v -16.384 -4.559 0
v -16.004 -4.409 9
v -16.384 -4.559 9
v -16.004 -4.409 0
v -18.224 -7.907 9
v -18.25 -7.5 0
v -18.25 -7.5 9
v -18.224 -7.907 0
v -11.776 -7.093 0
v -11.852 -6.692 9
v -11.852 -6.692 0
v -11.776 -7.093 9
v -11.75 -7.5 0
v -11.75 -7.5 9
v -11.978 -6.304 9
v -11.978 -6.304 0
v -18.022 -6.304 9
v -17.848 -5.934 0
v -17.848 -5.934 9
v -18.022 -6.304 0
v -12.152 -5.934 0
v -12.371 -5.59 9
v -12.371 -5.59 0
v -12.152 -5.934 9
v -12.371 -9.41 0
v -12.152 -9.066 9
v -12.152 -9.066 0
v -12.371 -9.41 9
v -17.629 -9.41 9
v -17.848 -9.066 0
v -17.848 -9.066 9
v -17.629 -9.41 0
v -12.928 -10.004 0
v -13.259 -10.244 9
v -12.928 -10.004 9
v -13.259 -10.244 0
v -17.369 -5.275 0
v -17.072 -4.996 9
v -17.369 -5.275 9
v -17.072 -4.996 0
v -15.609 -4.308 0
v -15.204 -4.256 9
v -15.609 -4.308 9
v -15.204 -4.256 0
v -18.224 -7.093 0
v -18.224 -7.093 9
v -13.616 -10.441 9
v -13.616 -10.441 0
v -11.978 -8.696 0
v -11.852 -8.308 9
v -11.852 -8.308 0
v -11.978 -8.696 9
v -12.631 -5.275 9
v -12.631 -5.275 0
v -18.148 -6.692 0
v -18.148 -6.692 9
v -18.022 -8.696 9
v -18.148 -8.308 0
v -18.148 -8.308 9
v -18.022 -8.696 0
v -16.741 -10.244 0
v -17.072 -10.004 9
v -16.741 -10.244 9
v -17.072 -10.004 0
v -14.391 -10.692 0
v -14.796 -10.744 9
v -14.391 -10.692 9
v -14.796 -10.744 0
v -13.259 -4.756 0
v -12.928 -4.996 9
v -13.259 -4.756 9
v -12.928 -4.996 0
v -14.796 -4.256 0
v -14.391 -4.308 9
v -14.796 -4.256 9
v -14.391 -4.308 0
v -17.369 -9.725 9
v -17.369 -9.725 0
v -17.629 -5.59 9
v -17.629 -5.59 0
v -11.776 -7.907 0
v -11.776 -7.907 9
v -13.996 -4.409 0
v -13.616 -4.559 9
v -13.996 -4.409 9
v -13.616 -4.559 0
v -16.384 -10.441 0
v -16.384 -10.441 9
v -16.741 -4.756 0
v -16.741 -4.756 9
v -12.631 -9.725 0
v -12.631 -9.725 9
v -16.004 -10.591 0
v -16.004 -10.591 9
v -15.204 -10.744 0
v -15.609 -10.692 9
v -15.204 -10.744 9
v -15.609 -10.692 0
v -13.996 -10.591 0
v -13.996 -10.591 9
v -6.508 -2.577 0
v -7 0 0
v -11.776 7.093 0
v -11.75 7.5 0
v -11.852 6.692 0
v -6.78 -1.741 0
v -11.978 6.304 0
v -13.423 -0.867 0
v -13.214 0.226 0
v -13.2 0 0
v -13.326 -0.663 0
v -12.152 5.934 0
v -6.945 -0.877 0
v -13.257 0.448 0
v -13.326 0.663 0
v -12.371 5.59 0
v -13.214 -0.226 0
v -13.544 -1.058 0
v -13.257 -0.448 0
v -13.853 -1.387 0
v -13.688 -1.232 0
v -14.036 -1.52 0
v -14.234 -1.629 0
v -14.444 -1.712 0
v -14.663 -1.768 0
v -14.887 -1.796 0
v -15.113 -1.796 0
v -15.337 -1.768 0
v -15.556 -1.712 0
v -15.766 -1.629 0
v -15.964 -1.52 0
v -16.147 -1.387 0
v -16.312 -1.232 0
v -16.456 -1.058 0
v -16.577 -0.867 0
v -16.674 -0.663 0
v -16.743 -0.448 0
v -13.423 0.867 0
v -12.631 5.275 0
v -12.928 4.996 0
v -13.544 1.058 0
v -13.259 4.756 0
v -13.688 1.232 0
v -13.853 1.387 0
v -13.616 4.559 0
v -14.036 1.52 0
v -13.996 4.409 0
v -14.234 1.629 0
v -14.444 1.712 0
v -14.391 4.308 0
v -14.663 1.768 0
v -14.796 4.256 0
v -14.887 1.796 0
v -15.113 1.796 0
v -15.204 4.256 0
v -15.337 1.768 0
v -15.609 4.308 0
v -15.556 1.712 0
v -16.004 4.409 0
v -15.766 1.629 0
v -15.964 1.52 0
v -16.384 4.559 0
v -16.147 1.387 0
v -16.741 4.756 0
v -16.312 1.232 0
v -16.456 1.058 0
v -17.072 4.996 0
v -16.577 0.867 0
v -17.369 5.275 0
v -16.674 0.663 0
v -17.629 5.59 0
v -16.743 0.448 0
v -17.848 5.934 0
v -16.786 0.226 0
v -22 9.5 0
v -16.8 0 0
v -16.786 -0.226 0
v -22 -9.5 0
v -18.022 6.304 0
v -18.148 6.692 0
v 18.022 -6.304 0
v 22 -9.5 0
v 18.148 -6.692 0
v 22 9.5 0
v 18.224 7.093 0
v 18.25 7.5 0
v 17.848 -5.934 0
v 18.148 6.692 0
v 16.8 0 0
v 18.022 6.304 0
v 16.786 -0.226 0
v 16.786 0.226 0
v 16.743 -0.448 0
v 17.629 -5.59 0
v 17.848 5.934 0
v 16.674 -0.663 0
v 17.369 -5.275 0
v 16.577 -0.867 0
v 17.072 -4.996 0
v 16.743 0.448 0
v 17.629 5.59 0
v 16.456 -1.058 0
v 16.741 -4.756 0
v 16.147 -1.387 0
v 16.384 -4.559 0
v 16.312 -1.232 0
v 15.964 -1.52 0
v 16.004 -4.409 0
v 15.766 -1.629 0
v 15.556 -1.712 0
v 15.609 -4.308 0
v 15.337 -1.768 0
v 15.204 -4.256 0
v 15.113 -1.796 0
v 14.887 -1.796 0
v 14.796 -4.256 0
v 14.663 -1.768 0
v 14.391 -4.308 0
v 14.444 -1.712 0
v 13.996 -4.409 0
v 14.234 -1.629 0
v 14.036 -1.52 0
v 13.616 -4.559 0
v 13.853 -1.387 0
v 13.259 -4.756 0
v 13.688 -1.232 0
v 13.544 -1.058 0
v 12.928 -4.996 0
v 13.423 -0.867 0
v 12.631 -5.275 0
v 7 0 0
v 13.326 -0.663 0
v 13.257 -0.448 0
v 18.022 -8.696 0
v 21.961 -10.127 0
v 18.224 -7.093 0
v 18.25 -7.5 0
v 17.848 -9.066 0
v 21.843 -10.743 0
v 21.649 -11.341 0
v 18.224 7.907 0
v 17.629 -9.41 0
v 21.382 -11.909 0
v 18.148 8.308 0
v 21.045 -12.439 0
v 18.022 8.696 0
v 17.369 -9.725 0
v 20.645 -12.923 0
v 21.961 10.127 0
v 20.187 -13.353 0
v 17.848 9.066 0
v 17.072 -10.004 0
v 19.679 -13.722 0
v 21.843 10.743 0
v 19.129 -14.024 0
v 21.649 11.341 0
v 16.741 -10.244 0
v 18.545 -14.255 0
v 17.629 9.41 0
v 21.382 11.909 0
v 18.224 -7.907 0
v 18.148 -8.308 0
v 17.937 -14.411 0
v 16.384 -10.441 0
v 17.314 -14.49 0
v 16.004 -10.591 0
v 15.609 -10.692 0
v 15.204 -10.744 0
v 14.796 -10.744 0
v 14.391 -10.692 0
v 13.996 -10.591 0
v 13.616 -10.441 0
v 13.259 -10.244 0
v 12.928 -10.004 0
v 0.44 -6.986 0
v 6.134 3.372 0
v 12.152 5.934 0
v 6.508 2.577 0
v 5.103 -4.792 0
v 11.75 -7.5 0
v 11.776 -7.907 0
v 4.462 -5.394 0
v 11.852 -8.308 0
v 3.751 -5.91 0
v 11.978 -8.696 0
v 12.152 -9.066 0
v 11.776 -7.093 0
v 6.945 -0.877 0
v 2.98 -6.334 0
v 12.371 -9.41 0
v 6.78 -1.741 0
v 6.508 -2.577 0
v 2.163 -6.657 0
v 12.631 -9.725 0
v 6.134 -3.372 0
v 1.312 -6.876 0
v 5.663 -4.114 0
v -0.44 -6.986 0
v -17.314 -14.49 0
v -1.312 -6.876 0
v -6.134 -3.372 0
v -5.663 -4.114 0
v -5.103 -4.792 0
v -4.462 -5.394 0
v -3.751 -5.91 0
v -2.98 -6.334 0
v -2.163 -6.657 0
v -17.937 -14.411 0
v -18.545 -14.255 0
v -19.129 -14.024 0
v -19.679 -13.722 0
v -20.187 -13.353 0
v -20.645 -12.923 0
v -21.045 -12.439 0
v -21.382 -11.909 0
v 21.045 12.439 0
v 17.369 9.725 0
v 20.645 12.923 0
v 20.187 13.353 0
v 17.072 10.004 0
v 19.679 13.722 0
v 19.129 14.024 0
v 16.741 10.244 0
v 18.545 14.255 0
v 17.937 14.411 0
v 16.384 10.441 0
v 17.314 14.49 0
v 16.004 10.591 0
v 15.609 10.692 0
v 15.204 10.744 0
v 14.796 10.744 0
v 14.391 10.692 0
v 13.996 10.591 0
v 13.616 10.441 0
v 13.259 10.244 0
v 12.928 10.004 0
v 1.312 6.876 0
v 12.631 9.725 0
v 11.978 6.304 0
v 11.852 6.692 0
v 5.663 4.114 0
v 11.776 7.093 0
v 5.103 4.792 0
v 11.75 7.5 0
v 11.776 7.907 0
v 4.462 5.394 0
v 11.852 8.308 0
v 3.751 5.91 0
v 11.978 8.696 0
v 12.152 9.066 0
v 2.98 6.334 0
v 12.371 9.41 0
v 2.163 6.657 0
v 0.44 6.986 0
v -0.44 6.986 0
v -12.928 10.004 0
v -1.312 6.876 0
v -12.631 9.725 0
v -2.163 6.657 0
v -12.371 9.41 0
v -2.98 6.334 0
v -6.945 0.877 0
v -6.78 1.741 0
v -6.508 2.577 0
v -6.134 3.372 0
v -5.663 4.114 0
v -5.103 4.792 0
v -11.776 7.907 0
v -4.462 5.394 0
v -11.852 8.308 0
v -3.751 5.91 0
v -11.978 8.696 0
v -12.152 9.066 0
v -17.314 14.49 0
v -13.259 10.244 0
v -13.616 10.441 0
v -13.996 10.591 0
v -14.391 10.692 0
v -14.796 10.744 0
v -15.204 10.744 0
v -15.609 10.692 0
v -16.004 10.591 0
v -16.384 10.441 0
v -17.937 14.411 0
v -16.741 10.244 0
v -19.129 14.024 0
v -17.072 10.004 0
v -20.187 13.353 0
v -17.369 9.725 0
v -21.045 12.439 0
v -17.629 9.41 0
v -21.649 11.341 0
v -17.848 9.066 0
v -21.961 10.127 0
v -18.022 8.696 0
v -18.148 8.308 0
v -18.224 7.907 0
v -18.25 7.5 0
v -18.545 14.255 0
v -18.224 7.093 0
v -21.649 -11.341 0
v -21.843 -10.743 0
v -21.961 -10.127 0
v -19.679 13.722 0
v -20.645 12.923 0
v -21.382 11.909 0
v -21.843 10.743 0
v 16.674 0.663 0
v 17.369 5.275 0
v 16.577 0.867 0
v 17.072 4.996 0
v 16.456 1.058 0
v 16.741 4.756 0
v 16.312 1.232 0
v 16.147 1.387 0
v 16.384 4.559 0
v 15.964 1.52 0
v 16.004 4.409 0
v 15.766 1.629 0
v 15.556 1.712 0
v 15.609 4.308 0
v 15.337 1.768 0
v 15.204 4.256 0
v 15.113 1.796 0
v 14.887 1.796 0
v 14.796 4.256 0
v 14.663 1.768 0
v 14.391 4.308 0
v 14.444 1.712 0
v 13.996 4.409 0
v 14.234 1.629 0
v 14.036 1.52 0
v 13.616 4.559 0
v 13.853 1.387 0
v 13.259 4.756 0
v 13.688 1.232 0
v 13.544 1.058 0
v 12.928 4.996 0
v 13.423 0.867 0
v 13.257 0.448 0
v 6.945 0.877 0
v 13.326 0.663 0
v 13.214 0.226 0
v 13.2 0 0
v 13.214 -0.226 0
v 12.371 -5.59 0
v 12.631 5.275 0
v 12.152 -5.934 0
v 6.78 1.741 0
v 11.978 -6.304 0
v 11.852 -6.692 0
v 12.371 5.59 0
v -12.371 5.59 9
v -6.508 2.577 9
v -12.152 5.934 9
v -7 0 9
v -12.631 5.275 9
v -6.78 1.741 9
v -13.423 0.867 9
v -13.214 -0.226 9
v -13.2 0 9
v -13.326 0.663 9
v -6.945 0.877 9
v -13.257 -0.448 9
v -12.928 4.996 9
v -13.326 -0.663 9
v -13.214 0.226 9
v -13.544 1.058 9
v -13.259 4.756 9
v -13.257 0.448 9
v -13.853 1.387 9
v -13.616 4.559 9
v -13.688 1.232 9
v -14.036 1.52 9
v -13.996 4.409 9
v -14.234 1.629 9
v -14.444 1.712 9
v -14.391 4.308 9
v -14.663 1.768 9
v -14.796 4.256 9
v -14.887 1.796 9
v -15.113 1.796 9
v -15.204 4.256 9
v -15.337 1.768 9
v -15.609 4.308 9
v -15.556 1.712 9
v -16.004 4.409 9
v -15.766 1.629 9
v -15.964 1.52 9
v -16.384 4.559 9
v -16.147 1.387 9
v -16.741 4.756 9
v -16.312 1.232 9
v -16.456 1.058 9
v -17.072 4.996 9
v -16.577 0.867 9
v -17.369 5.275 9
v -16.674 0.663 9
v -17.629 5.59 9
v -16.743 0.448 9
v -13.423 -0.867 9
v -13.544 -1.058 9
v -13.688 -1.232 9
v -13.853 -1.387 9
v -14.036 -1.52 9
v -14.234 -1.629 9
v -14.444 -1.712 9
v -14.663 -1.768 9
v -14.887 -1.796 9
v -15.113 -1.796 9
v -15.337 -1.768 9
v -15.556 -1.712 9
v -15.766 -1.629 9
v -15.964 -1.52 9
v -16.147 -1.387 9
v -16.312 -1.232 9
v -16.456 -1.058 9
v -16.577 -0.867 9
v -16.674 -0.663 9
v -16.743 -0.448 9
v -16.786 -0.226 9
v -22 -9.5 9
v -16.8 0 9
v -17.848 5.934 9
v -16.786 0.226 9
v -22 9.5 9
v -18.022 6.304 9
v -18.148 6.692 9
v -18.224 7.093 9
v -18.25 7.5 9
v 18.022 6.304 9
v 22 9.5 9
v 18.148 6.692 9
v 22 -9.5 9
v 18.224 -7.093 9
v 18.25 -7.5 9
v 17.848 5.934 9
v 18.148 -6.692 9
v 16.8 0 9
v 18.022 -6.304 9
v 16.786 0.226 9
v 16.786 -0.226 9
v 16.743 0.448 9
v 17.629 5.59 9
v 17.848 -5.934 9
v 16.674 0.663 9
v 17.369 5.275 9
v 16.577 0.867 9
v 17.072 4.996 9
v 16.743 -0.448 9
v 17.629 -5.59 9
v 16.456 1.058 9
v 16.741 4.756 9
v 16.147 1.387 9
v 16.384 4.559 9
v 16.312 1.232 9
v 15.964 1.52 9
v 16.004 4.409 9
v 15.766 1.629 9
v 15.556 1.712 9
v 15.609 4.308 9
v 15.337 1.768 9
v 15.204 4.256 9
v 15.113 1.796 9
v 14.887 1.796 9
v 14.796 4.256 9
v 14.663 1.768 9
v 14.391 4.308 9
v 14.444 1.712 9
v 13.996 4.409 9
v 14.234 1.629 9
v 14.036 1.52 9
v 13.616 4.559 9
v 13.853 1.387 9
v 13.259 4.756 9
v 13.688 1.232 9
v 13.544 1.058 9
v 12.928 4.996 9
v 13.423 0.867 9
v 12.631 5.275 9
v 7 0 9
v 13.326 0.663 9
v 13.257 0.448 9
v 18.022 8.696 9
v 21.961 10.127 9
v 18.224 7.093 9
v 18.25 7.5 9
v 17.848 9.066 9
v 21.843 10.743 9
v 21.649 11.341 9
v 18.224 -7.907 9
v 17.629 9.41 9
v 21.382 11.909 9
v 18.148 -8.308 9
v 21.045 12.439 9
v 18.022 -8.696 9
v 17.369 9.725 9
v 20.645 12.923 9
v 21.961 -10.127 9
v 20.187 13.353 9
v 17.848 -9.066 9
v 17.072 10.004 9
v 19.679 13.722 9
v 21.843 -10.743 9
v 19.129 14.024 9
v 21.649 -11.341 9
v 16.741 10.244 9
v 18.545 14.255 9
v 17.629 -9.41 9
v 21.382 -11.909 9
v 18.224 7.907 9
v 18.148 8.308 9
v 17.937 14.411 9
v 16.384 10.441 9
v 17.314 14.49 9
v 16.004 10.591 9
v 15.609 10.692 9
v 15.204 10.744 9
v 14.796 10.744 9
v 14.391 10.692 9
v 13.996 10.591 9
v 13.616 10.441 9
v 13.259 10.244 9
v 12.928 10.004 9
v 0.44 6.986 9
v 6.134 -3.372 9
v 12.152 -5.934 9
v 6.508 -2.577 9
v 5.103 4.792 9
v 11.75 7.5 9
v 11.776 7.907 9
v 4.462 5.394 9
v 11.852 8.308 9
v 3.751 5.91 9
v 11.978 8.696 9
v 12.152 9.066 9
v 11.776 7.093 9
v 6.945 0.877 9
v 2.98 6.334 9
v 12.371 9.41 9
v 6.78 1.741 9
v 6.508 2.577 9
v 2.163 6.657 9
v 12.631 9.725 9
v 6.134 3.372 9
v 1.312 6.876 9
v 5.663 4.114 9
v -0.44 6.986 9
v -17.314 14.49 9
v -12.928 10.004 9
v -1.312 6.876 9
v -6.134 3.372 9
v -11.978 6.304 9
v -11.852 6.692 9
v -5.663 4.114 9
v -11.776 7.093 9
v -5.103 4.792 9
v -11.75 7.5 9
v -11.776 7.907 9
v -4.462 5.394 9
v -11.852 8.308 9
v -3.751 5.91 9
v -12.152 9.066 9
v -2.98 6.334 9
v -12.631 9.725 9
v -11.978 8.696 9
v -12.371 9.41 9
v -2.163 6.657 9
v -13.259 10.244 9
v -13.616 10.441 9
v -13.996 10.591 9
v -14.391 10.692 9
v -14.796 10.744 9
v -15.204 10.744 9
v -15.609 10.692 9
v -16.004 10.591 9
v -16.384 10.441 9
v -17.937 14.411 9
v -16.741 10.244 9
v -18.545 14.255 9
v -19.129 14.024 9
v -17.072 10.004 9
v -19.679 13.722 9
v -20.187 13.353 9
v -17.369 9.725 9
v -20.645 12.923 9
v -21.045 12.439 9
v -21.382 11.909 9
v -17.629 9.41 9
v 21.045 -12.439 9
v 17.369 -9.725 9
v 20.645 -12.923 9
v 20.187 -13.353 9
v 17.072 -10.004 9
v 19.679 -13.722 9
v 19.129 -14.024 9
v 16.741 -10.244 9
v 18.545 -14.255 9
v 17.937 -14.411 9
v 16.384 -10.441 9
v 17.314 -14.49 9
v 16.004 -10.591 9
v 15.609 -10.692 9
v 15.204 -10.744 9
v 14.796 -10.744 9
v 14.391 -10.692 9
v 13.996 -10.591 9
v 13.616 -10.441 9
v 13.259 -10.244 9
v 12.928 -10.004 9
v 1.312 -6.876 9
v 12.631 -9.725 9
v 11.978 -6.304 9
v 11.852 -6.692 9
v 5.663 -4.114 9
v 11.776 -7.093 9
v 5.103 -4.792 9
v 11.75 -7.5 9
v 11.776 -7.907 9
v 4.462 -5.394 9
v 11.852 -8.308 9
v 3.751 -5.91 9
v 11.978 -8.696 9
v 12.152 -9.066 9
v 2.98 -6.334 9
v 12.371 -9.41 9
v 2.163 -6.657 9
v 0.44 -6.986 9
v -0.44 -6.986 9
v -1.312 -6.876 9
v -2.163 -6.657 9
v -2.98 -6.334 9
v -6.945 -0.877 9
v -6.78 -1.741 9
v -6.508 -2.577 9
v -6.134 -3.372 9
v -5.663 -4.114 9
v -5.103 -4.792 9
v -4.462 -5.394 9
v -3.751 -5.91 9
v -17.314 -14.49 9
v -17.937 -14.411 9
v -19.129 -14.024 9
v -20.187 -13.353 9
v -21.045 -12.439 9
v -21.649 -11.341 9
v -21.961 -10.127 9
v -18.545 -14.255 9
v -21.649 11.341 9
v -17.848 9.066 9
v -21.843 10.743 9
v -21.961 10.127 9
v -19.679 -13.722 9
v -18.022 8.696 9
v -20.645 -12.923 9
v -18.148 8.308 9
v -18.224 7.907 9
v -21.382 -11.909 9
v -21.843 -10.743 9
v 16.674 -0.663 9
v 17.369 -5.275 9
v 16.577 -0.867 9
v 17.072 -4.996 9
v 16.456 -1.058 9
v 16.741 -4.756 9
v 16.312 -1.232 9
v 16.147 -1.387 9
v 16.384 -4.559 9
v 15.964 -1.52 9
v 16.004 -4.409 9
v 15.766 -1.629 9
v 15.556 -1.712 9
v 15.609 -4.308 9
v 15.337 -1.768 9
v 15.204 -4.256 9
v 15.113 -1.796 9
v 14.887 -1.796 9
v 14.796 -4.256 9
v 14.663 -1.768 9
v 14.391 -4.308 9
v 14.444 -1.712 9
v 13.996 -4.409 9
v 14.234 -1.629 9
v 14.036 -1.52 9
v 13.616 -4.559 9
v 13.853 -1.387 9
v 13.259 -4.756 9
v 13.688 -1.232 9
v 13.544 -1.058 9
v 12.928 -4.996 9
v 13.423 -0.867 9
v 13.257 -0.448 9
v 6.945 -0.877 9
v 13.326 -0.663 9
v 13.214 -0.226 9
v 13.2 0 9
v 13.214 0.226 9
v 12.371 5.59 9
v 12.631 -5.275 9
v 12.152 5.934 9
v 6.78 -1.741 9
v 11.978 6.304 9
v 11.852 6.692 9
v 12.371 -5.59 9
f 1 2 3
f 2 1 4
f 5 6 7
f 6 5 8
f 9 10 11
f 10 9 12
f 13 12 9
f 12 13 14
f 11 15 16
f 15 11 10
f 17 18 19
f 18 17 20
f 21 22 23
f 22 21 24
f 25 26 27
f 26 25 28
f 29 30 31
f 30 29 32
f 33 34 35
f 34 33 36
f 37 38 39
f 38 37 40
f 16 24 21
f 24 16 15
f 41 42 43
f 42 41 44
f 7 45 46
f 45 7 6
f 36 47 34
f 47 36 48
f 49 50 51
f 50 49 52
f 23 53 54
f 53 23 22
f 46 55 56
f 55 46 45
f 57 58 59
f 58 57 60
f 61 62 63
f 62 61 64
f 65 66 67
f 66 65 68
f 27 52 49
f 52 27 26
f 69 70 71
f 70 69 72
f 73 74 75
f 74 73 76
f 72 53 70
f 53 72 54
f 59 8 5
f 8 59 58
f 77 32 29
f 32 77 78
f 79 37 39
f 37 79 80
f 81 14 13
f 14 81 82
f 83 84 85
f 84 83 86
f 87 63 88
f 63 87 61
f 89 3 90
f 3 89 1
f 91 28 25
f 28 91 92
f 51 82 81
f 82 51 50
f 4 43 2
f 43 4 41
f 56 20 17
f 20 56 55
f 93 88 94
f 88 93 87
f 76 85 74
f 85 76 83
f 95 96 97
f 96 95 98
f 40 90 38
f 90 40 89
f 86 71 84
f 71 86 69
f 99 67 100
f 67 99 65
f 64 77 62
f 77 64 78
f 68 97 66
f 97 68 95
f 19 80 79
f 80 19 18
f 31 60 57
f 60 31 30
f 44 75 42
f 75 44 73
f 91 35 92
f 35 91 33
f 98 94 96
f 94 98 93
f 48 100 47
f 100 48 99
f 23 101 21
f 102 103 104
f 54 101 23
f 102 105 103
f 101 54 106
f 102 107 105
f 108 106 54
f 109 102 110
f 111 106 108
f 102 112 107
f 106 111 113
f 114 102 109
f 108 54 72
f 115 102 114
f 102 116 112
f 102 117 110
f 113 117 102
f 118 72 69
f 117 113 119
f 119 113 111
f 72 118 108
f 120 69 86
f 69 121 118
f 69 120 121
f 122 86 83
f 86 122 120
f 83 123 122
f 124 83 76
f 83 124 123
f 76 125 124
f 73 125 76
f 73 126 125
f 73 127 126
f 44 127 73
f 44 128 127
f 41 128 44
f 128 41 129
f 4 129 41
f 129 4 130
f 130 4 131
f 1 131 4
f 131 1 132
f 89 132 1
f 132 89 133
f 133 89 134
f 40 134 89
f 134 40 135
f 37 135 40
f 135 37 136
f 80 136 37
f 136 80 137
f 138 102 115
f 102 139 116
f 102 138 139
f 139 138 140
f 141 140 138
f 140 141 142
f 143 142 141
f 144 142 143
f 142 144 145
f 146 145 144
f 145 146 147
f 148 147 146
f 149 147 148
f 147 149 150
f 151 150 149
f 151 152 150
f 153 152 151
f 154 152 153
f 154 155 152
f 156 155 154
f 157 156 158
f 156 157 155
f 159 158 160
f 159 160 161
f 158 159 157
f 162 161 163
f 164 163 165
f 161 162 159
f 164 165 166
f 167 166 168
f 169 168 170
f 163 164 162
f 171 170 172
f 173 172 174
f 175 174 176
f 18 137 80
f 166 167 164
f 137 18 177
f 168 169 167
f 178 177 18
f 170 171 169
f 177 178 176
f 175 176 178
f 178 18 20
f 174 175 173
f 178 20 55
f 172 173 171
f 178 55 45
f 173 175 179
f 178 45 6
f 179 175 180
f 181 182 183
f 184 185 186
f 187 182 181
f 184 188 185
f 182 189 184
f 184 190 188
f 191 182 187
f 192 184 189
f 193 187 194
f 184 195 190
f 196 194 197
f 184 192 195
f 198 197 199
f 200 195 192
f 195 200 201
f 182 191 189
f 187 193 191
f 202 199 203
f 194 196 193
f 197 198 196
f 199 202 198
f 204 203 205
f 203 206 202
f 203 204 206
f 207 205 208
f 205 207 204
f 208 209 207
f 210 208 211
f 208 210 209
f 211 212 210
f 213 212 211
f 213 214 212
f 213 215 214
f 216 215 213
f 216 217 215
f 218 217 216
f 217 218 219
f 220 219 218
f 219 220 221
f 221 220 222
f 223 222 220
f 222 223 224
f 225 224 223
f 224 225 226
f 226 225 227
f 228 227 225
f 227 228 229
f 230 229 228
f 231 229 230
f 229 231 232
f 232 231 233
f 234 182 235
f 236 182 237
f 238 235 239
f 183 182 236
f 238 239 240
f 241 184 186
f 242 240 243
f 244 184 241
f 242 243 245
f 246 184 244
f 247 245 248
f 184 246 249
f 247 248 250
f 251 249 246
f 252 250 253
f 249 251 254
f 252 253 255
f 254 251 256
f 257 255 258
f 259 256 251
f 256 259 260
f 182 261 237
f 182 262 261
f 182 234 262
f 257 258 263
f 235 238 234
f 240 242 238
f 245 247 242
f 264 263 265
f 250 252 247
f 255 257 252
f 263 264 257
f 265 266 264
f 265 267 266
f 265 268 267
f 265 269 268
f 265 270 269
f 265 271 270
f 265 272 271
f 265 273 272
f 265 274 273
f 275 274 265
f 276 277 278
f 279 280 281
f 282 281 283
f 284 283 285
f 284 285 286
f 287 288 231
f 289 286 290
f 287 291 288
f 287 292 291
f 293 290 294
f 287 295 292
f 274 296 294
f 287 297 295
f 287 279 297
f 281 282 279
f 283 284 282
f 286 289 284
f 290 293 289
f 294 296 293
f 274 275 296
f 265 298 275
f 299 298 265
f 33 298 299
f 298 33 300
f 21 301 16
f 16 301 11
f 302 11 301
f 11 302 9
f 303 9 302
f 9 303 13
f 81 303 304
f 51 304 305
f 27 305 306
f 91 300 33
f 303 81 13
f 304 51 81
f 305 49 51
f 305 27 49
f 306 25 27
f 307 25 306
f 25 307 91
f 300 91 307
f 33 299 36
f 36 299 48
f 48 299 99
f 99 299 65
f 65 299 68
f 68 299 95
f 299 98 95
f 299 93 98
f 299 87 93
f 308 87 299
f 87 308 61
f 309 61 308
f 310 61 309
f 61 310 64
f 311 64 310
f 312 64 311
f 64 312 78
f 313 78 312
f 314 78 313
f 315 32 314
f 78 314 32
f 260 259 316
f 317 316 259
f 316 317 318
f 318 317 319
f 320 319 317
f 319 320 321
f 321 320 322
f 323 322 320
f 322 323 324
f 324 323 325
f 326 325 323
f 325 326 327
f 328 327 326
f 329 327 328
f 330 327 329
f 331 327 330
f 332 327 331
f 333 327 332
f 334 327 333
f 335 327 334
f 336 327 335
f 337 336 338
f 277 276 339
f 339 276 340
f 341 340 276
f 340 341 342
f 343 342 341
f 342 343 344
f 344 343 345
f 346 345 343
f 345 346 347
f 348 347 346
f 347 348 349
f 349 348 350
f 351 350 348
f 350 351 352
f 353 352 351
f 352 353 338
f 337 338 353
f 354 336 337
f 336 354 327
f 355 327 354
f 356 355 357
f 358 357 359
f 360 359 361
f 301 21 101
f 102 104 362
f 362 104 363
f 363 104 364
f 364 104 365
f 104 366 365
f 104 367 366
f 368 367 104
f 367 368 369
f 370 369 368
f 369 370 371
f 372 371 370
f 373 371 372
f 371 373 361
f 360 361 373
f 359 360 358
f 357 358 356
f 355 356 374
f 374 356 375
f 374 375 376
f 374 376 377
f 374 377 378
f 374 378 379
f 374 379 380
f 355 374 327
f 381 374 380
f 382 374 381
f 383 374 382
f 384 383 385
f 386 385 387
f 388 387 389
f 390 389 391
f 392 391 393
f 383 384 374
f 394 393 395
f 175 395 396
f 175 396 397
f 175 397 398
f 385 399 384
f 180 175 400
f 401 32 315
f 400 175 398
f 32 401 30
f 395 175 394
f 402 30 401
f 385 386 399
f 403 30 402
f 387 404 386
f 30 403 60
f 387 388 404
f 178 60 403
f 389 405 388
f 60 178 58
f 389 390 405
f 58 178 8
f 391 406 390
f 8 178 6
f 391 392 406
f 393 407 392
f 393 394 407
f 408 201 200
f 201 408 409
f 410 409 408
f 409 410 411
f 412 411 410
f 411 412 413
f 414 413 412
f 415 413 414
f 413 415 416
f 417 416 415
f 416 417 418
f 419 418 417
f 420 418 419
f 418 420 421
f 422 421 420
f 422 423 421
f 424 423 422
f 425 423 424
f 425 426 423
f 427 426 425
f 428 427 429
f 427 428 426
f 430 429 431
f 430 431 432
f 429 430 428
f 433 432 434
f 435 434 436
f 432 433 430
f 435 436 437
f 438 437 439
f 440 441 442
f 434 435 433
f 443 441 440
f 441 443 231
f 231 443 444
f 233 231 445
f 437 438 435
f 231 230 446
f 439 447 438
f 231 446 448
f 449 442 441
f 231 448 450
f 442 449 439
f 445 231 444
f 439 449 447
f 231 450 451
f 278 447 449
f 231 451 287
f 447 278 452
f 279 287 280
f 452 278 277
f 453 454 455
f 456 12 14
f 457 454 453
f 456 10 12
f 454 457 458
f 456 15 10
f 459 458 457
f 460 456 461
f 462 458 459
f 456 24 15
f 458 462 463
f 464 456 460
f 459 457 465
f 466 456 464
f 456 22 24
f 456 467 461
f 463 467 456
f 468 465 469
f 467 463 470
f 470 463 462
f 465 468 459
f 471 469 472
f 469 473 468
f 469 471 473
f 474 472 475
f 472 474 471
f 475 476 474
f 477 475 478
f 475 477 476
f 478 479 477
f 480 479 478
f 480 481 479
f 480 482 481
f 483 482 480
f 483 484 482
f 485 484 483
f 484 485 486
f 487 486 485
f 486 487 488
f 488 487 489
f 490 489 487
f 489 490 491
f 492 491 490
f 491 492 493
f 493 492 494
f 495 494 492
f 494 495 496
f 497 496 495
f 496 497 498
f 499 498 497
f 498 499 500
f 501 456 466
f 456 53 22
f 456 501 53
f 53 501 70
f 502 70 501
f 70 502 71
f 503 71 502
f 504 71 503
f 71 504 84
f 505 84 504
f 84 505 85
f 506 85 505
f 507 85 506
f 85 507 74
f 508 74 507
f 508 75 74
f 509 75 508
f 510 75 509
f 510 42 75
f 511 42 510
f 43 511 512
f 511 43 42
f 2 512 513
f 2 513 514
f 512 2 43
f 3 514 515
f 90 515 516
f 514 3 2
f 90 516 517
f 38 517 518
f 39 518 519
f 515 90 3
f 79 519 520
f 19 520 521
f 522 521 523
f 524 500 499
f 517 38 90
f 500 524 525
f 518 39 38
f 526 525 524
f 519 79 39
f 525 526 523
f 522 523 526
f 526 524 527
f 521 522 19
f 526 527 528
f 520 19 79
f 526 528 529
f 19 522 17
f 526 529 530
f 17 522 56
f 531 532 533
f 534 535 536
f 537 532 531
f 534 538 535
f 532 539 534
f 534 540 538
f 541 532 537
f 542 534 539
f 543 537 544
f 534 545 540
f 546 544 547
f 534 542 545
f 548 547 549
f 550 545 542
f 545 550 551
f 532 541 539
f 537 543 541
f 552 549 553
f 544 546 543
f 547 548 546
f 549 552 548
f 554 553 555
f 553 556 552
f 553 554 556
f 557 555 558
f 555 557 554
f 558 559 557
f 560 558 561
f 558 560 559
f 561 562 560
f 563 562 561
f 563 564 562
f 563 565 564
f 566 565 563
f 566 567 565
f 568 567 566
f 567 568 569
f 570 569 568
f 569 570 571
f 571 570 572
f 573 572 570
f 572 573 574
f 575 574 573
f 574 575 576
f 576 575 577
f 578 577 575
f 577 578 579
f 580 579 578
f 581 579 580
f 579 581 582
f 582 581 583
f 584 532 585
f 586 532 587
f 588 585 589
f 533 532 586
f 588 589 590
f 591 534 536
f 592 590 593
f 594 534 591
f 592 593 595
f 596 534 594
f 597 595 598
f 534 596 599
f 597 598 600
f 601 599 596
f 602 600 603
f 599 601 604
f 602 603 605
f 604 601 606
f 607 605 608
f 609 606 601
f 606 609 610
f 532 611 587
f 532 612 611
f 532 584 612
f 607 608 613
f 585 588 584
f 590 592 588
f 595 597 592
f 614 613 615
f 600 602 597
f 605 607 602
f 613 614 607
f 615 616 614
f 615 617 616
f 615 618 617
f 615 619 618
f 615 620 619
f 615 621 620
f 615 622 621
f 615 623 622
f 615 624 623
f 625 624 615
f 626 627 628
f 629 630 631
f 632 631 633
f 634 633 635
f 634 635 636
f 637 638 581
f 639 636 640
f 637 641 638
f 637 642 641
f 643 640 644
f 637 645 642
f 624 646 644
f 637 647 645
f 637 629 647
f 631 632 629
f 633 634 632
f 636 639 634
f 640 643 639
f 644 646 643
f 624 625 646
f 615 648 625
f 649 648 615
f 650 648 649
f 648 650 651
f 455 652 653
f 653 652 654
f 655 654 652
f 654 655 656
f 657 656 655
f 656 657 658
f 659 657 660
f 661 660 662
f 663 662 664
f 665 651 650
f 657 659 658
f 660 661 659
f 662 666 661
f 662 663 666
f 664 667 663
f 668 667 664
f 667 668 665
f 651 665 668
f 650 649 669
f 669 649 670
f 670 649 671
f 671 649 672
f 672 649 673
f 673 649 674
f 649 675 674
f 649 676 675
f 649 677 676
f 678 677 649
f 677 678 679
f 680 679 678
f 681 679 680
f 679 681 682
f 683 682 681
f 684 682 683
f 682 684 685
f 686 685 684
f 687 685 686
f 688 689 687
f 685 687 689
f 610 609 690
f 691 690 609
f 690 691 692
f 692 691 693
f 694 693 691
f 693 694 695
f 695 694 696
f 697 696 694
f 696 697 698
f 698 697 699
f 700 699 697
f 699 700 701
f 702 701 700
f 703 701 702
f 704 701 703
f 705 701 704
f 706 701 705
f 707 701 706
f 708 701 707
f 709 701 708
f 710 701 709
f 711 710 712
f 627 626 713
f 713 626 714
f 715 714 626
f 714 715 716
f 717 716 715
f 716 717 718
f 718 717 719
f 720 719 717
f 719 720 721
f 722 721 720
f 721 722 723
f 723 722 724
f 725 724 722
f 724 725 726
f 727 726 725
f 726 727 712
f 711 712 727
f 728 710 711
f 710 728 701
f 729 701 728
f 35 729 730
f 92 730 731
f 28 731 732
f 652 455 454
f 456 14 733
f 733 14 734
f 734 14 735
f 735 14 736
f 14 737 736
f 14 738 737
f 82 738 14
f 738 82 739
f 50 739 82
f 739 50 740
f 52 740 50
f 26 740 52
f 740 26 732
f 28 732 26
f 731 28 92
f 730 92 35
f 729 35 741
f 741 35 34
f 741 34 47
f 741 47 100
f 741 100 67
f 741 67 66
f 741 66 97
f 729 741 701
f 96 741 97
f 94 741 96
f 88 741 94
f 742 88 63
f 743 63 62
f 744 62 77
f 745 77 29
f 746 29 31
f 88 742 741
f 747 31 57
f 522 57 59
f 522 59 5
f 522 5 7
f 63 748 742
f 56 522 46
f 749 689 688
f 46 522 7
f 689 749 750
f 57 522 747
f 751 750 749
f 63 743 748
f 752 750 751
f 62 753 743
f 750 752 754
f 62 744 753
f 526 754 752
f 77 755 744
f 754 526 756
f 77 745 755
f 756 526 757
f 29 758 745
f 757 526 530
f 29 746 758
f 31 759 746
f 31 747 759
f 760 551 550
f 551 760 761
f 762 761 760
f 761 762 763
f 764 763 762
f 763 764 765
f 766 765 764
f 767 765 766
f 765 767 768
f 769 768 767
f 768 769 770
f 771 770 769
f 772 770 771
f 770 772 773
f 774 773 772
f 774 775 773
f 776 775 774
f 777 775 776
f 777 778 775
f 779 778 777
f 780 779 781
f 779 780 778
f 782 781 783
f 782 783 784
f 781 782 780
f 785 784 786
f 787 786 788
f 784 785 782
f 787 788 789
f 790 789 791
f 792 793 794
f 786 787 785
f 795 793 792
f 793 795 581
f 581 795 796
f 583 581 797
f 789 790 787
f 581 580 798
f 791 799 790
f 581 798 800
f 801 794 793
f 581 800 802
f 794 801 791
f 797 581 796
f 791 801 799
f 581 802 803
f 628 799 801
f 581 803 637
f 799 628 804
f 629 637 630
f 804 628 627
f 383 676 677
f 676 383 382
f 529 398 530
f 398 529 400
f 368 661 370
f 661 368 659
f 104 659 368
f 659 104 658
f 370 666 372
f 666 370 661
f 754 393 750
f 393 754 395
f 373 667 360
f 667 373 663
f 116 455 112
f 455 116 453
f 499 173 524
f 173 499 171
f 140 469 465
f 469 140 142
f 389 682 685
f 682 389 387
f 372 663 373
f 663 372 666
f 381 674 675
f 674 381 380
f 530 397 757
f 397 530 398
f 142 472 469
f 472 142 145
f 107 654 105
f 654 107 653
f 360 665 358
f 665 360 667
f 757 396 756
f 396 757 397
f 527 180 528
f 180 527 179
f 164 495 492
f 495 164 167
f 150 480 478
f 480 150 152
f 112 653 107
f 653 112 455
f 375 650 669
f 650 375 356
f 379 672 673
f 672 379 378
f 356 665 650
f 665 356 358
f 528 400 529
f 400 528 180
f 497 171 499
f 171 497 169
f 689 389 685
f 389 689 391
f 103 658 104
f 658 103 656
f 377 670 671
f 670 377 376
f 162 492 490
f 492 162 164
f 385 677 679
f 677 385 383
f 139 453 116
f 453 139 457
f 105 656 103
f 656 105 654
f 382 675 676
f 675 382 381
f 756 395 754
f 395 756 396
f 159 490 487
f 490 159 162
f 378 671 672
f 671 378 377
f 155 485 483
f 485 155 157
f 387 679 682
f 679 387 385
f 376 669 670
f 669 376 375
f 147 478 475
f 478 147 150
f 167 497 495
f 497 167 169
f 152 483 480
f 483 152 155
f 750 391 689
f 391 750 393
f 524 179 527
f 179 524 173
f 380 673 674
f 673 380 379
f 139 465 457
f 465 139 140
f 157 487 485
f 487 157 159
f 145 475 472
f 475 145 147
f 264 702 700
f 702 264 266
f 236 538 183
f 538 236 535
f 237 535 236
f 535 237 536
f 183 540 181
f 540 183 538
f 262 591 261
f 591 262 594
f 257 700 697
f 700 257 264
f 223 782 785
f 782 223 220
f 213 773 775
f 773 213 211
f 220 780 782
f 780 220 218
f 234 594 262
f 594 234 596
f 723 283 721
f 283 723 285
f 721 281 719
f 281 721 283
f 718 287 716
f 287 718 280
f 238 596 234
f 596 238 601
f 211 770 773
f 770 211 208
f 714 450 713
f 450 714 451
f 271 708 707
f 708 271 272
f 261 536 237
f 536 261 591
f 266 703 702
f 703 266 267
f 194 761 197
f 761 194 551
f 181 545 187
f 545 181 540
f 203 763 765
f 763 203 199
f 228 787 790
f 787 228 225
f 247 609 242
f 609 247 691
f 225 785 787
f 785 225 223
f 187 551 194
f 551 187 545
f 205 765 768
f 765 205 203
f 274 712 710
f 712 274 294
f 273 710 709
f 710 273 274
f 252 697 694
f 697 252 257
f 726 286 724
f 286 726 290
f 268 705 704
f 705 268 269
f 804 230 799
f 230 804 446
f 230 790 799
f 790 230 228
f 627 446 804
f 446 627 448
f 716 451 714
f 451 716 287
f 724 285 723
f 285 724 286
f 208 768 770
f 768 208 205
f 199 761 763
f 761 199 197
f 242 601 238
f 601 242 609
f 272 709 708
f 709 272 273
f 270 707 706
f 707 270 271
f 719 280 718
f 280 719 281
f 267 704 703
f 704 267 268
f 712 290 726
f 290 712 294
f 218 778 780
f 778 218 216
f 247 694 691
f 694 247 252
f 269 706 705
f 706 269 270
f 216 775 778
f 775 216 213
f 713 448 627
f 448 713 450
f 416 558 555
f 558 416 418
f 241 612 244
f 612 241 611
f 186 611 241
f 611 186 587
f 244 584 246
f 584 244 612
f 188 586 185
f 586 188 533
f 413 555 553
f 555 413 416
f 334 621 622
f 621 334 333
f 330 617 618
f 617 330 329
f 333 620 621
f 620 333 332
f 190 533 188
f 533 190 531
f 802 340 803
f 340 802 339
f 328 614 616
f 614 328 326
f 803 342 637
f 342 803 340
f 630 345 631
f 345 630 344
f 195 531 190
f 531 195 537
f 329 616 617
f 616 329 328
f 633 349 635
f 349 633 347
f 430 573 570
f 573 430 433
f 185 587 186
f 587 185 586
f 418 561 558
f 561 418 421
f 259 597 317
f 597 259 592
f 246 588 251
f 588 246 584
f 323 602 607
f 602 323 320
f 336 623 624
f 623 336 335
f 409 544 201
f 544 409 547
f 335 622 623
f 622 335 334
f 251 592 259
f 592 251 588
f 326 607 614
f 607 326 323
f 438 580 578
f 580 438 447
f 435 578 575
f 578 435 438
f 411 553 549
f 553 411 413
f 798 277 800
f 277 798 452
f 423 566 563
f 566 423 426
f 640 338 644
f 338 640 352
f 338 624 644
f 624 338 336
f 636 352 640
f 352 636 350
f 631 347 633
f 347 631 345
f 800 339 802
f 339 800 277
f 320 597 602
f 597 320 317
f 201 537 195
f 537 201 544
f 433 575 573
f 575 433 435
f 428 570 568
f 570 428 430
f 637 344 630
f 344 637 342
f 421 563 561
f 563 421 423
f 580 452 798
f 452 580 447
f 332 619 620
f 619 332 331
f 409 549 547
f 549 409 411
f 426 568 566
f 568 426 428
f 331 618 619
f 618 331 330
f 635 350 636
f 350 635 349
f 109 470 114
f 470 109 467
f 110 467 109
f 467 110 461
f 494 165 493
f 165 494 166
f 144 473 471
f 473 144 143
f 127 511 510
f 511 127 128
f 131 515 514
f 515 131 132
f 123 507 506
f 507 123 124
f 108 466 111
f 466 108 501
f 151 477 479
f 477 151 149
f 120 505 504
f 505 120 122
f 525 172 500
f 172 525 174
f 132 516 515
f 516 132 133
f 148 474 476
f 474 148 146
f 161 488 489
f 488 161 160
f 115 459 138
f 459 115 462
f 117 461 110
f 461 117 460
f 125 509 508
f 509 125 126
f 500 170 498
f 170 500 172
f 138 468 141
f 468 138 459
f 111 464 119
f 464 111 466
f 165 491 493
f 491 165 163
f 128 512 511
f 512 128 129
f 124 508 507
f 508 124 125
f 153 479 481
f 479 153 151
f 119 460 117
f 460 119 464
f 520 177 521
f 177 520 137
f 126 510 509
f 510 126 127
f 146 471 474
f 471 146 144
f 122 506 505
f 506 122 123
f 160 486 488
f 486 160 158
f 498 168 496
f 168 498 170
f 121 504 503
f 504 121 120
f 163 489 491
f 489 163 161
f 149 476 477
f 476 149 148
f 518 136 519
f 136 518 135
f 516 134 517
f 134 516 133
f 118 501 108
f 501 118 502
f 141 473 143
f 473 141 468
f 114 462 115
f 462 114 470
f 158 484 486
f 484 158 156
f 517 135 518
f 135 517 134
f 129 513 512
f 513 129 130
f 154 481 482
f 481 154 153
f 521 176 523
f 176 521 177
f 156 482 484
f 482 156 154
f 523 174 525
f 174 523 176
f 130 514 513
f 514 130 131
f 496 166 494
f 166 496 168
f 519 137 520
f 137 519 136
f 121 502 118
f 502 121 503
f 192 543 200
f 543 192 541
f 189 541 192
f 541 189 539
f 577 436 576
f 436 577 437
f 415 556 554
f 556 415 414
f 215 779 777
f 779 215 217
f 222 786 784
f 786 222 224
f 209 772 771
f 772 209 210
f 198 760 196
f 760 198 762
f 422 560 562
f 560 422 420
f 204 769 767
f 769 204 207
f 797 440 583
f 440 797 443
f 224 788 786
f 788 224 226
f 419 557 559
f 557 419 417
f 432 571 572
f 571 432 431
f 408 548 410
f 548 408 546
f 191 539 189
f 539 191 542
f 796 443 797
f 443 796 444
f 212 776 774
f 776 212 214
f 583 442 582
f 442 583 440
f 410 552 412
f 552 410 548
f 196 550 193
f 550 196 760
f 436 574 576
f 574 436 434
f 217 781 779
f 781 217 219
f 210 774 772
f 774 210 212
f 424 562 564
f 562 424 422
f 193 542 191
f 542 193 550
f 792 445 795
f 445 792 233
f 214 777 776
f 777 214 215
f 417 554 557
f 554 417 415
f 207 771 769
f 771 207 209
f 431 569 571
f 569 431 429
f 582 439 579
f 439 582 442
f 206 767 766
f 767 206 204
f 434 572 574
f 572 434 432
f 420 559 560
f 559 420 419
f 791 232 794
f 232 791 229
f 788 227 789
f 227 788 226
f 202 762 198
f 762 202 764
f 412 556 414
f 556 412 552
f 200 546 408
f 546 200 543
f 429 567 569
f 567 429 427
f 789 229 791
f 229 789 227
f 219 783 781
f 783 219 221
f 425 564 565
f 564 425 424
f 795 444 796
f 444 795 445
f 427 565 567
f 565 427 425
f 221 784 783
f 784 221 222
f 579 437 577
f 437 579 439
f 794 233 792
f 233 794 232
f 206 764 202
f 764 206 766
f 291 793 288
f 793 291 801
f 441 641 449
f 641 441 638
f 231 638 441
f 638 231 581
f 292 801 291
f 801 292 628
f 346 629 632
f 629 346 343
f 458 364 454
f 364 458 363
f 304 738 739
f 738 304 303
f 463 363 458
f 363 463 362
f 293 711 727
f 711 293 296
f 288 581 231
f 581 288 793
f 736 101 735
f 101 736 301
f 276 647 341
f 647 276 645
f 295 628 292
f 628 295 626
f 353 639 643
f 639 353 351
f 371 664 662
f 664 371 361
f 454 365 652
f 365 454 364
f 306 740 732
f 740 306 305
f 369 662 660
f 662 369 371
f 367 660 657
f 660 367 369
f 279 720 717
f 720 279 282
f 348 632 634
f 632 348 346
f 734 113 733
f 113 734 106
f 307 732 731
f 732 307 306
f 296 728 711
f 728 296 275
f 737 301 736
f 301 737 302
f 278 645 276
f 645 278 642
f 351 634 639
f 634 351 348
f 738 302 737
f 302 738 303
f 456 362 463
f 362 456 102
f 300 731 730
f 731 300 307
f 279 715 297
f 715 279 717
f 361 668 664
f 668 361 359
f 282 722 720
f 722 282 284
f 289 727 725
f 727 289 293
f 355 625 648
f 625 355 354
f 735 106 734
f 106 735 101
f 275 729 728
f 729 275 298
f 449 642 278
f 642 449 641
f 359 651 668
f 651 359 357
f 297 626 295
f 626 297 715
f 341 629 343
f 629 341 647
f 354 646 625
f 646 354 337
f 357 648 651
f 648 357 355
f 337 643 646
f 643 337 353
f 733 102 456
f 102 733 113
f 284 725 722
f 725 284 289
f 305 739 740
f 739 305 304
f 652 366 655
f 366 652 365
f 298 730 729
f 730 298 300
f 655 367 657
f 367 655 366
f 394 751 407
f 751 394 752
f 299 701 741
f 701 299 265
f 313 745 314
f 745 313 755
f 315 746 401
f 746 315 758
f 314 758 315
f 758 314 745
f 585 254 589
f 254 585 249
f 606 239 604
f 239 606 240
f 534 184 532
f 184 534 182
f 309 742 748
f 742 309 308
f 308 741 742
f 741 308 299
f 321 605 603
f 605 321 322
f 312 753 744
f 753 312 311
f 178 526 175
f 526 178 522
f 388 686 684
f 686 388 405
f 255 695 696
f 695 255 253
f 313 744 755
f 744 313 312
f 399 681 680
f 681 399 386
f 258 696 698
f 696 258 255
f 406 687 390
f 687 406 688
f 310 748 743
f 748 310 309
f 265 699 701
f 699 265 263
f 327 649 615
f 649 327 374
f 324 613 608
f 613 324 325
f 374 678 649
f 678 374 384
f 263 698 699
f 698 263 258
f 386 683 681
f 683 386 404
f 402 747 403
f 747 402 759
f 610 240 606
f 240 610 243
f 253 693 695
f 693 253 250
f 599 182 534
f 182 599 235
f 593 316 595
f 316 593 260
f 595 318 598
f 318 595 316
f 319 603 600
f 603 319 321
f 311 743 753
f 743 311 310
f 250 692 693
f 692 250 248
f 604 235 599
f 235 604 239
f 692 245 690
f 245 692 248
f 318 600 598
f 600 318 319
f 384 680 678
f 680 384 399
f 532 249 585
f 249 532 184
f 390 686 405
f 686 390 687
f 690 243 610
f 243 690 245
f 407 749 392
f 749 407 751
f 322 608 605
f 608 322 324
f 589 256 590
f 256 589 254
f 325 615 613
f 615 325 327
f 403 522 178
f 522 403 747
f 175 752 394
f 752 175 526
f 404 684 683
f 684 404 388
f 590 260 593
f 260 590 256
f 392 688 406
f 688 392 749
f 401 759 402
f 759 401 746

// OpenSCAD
$fn = 50;

difference() {
	union() {
		hull() {
			translate(v = [-17.0, 9.5, 0]) {
				cylinder(h = 9, r = 5);
			}
			translate(v = [17.0, 9.5, 0]) {
				cylinder(h = 9, r = 5);
			}
			translate(v = [-17.0, -9.5, 0]) {
				cylinder(h = 9, r = 5);
			}
			translate(v = [17.0, -9.5, 0]) {
				cylinder(h = 9, r = 5);
			}
		}
	}
	union() {
		translate(v = [-15.0, -7.5, 0]) {
			cylinder(h = 9, r = 3.25);
		}
		translate(v = [-15.0, 7.5, 0]) {
			cylinder(h = 9, r = 3.25);
		}
		translate(v = [15.0, -7.5, 0]) {
			cylinder(h = 9, r = 3.25);
		}
		translate(v = [15.0, 7.5, 0]) {
			cylinder(h = 9, r = 3.25);
		}
		translate(v = [-15.0, 0.0, 0]) {
			cylinder(h = 9, r = 1.8);
		}
		translate(v = [15.0, 0.0, 0]) {
			cylinder(h = 9, r = 1.8);
		}
		cylinder(h = 9, r = 7.0);
	}
}
